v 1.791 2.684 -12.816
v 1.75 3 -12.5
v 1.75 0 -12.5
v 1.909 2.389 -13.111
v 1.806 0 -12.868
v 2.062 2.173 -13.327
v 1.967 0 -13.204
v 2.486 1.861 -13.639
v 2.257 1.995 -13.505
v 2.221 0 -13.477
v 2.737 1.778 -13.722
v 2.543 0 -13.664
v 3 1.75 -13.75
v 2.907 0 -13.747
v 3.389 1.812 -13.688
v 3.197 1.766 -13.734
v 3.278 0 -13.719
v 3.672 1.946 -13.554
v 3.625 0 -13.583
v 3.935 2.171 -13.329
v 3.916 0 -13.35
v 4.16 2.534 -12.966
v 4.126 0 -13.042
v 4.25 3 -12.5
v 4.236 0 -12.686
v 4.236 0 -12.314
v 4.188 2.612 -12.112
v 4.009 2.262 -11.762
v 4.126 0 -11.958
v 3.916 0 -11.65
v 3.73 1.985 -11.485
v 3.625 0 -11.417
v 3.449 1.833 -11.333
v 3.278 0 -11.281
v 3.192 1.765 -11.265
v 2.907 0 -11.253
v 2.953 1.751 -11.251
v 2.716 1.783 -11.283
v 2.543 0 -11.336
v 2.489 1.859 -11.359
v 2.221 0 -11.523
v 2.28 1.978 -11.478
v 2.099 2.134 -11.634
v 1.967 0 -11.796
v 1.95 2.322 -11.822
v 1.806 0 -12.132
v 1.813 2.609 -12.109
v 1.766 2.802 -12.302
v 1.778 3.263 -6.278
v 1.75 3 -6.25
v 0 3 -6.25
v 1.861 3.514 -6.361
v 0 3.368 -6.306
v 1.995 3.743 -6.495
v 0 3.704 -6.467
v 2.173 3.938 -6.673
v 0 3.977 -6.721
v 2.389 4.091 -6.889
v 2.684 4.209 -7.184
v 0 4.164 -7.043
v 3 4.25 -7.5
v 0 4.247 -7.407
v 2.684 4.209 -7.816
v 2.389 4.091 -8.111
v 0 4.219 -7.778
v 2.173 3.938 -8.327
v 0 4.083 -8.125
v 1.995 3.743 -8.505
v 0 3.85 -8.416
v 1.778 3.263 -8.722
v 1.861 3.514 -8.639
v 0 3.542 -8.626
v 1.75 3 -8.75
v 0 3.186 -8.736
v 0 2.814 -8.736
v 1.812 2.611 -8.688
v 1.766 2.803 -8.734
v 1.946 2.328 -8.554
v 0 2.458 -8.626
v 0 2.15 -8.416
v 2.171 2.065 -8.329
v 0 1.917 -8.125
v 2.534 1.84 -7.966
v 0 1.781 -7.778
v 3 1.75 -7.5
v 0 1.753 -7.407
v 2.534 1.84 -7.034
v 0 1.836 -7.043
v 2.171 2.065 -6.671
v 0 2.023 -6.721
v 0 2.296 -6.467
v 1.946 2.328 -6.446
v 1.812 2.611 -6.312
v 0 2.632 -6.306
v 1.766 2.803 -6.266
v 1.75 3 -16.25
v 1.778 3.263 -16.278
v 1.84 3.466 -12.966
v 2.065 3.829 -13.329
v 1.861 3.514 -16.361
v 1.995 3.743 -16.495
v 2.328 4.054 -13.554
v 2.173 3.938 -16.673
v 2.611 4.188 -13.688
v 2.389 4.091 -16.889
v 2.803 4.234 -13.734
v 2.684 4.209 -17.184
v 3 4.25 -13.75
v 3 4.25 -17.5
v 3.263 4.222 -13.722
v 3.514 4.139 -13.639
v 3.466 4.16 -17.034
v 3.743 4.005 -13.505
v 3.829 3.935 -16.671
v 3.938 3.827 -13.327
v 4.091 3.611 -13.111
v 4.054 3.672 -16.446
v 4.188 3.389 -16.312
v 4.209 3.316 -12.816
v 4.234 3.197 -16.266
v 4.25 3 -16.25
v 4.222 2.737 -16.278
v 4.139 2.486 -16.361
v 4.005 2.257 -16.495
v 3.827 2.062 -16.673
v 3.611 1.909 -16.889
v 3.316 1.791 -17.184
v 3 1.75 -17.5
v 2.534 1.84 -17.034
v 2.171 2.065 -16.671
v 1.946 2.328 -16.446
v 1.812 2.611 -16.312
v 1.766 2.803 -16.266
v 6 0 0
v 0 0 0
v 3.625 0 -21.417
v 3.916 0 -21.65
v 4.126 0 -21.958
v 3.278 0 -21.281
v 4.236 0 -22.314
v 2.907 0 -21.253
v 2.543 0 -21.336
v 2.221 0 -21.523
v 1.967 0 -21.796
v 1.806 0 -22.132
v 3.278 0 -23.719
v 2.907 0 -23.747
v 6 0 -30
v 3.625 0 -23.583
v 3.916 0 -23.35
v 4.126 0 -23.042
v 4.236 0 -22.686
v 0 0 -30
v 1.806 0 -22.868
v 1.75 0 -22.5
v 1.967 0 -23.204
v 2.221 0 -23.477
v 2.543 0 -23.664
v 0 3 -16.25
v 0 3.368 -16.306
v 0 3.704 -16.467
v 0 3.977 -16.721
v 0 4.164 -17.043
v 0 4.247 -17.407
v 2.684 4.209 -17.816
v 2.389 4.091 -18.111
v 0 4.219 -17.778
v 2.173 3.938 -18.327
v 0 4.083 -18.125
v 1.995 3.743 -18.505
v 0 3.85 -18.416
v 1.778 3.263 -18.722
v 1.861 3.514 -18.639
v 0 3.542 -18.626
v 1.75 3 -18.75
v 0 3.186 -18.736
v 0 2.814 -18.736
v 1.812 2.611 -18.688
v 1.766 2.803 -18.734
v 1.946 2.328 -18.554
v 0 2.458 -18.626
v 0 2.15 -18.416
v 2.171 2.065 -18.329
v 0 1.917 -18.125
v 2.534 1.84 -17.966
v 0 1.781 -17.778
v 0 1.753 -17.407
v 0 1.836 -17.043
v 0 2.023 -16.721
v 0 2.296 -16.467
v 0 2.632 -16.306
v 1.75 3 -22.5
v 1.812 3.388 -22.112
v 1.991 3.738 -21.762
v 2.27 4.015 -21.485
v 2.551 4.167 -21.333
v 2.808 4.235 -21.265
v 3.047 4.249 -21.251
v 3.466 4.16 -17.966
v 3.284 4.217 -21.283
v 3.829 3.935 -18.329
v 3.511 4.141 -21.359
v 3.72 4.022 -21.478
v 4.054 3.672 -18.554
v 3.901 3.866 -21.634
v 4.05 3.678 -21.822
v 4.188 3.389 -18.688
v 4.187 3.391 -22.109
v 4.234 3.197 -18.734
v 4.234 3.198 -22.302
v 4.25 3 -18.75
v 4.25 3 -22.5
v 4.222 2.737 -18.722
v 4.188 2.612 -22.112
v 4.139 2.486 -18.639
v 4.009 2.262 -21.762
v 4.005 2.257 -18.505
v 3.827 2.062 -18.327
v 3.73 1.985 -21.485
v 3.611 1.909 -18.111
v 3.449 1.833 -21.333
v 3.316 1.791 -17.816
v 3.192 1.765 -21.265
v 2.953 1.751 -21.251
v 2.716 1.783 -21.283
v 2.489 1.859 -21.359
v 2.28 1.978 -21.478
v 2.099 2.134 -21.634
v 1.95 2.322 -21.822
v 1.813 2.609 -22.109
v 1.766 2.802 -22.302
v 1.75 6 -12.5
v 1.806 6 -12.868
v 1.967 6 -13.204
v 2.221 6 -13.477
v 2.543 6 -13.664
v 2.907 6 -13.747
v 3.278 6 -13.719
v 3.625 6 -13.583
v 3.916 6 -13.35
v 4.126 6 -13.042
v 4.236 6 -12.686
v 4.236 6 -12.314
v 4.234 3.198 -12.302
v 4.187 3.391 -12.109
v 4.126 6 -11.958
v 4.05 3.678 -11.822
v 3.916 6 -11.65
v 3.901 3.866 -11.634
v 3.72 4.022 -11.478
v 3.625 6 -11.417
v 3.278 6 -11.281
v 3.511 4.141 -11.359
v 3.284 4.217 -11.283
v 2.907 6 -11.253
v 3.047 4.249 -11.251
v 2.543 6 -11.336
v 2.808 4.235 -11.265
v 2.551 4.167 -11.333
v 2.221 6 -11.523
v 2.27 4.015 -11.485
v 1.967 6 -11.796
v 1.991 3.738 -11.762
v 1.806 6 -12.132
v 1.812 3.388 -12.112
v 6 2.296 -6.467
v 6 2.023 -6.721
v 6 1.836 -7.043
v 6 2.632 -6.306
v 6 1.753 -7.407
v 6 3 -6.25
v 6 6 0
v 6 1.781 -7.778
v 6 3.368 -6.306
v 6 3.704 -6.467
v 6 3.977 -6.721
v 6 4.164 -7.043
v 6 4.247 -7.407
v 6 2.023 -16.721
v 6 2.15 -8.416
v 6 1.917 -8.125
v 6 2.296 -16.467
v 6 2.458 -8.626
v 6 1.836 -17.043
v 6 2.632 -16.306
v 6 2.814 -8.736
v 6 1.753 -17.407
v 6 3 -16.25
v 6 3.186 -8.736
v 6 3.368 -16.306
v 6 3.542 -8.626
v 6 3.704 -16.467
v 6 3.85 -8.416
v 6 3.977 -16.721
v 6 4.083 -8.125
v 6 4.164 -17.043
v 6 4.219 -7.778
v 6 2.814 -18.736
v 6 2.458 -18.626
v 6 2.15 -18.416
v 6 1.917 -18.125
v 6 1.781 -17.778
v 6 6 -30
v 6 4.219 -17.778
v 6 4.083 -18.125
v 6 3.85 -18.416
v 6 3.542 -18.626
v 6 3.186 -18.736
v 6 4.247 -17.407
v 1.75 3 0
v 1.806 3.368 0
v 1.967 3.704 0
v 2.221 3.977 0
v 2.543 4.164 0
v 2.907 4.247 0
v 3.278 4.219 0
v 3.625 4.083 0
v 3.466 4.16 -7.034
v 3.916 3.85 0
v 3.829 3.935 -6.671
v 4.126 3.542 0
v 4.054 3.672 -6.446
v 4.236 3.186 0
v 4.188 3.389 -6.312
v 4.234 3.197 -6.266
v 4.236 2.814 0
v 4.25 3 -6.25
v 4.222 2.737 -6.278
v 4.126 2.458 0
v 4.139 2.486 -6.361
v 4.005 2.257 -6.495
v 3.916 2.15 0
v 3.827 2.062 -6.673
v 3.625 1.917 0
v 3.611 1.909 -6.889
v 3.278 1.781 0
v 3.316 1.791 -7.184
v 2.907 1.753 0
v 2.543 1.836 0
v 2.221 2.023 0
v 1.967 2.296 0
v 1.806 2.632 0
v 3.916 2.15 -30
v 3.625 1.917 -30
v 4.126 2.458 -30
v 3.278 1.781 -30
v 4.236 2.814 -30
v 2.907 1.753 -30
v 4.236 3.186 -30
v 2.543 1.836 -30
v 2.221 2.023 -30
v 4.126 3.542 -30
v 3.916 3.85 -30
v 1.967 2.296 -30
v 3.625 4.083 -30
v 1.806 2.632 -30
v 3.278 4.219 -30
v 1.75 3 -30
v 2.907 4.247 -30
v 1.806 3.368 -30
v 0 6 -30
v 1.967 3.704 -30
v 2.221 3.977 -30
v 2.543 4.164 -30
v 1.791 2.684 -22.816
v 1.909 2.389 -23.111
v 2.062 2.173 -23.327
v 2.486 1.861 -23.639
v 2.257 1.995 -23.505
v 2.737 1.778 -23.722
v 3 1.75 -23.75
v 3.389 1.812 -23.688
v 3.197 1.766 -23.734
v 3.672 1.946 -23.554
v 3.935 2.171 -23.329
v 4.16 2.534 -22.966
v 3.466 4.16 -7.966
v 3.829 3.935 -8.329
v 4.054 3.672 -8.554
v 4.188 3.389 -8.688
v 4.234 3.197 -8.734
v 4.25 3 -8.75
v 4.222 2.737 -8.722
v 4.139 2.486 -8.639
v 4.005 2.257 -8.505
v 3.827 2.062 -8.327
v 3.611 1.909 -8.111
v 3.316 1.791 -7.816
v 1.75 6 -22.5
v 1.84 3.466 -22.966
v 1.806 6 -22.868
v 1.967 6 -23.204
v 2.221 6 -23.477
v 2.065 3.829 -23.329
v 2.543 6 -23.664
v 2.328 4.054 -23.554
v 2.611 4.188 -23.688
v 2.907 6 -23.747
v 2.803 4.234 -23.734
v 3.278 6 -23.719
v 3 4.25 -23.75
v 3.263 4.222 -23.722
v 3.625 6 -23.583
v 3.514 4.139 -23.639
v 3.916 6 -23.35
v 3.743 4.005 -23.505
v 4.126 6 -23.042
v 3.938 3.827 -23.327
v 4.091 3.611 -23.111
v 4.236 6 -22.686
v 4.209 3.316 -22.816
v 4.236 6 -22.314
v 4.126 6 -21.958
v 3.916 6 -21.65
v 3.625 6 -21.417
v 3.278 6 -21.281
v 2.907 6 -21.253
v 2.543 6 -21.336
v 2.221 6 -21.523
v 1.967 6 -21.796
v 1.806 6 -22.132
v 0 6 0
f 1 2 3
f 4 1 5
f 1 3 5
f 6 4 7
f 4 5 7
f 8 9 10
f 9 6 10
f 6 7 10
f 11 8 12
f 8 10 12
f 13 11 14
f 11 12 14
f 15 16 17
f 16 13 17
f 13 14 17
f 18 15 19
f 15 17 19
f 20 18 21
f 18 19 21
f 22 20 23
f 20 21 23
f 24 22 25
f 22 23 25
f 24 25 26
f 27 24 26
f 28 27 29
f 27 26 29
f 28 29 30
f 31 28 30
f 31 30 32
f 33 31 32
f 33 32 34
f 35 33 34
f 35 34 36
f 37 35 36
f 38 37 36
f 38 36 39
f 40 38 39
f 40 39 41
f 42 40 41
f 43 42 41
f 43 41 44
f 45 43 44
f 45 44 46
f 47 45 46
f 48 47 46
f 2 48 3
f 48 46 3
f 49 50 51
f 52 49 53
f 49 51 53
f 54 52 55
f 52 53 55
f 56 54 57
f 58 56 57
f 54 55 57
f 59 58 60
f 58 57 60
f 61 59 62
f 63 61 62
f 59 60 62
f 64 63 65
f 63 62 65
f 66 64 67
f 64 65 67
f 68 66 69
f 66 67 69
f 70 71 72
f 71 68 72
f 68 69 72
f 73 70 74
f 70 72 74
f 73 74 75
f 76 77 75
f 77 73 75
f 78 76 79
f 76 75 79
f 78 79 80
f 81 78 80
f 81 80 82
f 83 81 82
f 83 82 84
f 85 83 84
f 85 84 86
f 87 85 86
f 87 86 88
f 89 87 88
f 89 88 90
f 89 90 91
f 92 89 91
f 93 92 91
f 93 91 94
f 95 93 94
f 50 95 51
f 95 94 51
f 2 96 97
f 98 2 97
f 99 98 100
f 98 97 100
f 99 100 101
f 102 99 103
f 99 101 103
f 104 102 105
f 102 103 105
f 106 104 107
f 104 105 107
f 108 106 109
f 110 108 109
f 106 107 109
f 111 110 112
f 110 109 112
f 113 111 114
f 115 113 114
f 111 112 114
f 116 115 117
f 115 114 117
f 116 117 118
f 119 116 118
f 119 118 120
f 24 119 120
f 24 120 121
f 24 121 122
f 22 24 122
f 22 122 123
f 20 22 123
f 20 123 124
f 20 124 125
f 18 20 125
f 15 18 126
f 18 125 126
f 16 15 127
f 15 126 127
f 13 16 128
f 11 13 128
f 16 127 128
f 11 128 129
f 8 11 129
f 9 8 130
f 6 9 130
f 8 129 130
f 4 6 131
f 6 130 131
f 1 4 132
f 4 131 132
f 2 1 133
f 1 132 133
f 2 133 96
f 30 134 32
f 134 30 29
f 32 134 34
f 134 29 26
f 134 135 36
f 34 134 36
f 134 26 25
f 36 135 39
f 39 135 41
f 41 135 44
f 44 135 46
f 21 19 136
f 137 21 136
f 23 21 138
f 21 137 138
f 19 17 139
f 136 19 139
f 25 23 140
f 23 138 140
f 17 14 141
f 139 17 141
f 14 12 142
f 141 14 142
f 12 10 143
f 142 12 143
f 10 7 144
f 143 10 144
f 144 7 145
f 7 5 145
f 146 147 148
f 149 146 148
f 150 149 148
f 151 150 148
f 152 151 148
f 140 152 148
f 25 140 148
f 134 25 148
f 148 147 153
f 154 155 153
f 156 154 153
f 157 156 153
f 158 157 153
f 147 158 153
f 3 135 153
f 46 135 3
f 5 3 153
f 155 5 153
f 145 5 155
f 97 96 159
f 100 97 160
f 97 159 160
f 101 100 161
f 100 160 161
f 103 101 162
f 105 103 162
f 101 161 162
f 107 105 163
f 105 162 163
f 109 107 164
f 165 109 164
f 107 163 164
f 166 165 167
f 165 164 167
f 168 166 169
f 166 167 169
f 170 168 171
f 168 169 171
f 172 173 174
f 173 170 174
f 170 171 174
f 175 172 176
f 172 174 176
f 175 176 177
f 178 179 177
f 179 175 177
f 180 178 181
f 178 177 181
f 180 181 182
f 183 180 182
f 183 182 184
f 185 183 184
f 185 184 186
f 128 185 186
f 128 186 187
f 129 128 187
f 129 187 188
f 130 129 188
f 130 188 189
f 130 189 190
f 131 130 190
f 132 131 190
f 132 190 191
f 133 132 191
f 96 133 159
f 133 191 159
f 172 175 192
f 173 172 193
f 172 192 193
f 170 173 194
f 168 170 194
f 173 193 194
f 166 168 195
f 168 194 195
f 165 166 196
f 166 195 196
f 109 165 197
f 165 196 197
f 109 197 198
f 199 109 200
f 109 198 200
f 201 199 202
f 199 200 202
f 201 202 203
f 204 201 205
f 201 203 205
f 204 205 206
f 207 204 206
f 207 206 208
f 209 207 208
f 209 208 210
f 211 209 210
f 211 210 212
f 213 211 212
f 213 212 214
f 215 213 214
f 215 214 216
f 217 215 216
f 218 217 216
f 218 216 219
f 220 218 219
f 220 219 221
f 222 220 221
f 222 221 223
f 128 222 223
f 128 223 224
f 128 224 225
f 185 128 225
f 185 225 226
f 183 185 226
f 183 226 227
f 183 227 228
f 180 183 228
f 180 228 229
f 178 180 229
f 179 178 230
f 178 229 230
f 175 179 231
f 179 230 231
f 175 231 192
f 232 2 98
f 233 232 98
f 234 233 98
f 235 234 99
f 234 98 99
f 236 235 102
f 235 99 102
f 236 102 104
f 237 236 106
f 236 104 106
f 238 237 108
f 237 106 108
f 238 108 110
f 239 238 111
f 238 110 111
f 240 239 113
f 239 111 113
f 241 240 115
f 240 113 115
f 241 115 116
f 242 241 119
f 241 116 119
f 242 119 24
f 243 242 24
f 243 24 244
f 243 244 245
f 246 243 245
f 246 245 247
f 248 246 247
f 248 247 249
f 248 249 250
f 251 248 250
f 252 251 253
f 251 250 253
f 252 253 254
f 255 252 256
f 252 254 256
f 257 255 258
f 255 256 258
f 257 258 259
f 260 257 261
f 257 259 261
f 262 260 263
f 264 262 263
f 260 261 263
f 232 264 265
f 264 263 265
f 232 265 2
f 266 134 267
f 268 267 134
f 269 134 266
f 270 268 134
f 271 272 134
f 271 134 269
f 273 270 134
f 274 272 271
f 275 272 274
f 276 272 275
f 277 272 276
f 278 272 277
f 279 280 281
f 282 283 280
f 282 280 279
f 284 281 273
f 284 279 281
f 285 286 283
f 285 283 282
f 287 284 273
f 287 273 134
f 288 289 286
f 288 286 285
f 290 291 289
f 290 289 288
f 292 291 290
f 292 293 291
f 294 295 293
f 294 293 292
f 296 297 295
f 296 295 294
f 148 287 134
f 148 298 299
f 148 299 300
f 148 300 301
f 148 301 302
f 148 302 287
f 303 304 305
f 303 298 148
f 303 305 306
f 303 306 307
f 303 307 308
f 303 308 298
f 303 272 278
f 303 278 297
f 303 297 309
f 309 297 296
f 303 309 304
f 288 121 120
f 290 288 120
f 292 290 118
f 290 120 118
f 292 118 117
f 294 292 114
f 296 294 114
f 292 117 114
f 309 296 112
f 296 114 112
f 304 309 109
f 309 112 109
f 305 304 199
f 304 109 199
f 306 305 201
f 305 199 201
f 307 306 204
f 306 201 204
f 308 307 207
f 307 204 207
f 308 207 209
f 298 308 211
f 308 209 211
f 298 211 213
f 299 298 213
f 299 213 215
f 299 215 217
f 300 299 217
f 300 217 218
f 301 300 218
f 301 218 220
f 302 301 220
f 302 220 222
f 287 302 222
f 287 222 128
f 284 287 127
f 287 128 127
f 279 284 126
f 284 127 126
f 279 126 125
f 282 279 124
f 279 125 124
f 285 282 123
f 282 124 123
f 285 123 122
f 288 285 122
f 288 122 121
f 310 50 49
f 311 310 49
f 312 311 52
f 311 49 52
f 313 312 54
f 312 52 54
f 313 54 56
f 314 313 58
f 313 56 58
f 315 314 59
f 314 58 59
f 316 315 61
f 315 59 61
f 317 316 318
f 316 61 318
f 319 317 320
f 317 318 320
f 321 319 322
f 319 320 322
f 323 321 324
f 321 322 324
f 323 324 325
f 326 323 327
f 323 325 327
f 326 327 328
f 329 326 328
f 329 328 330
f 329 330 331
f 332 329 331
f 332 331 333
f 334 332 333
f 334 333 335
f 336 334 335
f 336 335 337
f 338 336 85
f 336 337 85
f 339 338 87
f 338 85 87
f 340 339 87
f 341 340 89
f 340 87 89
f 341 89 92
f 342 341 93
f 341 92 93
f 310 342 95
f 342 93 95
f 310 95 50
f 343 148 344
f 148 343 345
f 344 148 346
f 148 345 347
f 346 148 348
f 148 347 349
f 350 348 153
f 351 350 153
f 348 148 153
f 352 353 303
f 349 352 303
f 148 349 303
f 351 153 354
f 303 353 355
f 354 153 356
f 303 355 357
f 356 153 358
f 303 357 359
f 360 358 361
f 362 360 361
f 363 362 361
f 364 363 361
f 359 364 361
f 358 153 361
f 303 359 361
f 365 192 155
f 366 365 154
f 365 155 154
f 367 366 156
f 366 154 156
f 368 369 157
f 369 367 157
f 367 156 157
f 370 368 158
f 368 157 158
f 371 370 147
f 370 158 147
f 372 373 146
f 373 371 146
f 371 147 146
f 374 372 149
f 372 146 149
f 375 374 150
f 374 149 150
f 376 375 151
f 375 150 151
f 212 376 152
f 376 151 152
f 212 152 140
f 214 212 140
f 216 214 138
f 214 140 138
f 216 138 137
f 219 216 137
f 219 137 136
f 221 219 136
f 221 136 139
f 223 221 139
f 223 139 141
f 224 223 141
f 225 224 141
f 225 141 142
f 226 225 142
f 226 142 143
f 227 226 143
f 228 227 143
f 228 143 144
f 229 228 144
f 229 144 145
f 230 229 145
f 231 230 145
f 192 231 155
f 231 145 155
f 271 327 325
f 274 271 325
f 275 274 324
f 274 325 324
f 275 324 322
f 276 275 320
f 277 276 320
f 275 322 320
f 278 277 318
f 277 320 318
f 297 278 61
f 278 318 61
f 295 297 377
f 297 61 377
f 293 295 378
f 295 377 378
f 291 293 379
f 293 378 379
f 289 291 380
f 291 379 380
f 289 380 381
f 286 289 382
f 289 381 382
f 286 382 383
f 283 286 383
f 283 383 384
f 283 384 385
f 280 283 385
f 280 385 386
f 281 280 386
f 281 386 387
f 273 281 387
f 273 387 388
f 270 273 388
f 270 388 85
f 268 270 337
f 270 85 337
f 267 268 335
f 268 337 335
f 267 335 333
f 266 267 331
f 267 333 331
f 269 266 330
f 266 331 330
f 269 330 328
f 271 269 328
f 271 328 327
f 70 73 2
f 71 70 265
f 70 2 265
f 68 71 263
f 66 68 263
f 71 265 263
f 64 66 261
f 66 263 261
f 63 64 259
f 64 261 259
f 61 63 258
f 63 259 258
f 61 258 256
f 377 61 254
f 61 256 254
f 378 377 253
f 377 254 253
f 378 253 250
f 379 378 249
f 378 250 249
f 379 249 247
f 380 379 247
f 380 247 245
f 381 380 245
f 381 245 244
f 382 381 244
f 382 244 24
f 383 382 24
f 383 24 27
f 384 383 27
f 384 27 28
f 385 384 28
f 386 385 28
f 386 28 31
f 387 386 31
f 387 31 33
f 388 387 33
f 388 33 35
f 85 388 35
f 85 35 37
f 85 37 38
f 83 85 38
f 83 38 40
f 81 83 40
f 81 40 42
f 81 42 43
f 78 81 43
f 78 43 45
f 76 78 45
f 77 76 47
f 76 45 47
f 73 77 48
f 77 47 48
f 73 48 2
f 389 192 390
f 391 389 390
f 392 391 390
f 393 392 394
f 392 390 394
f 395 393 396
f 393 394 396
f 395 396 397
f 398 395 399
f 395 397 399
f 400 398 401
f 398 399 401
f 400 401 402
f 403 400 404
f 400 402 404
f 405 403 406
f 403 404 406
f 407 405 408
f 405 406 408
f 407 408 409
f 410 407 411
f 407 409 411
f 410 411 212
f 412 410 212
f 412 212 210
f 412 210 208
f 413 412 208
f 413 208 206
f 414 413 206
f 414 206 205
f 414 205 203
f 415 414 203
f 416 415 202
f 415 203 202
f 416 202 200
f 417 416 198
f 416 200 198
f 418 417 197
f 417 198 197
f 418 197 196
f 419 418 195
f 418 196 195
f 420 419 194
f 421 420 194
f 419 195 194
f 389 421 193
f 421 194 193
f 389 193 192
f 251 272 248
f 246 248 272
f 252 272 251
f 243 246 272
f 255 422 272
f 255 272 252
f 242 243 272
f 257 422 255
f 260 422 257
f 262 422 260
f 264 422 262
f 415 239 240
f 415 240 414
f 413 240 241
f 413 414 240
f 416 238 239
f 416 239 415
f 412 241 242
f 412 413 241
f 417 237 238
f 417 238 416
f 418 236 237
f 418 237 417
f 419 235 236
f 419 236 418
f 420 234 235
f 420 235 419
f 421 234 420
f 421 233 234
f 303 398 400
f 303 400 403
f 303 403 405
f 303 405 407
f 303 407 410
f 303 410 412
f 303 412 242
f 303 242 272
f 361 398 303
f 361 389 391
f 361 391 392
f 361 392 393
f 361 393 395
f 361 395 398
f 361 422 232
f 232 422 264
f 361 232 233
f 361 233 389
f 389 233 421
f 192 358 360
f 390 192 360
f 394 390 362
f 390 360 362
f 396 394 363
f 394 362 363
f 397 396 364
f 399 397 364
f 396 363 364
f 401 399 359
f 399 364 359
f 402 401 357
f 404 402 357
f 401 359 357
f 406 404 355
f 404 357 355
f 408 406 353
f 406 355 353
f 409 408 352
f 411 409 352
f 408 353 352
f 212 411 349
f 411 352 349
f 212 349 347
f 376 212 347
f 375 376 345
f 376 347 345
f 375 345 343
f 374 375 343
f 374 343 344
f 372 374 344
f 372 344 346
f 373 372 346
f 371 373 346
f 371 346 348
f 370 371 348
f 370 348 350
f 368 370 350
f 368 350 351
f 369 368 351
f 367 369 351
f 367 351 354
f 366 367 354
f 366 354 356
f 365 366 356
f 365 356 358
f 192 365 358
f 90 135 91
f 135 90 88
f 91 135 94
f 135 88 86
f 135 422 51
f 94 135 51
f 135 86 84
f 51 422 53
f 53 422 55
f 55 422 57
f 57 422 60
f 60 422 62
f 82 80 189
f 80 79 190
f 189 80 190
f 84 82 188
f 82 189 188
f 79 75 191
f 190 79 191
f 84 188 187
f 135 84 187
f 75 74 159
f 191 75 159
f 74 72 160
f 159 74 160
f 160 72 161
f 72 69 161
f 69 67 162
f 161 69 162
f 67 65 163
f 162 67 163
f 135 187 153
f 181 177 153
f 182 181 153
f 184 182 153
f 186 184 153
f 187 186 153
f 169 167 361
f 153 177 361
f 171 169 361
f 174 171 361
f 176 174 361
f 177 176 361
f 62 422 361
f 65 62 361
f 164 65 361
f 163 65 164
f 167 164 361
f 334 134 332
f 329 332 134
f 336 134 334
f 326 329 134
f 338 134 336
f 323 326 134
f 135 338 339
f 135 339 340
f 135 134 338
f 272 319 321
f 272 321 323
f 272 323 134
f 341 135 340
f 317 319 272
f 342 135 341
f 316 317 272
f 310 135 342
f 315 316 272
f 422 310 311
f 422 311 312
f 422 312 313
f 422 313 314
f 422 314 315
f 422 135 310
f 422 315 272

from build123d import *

# Parameters (mm, degrees)
SKETCH_1_W         = 30
SKETCH_1_H         = 6
EXTRUDE_1_DEPTH    = 6
HOLE_WIZARD_M3_1_D = 2.5
HOLE_WIZARD_M3_2_D = 2.5
HOLE_WIZARD_M3_3_D = 2.5


with BuildPart() as part:
    # 草图1 → 凸台-拉伸1 (new body)
    with BuildSketch(Plane(origin=(0, 0, 0), x_dir=(0, 0, -1), z_dir=(1, 0, 0))):
        with Locations((15, 3)):
            Rectangle(SKETCH_1_W, SKETCH_1_H)
    extrude(amount=EXTRUDE_1_DEPTH)

    # M3 螺纹孔1 (through all)
    with Locations(Plane.XY):
        with Locations((3, 3)):
            Hole(HOLE_WIZARD_M3_1_D / 2)

    # M3 螺纹孔2 (through all)
    with Locations(Plane(origin=(0, 6, 0), x_dir=(1, 0, 0), z_dir=(0, 1, 0))):
        with Locations((3, 12.5), (3, 22.5)):
            Hole(HOLE_WIZARD_M3_2_D / 2)

    # M3 螺纹孔3 (through all)
    with Locations(Plane(origin=(6, 0, 0), x_dir=(0, 0, -1), z_dir=(1, 0, 0))):
        with Locations((17.5, 3), (7.5, 3)):
            Hole(HOLE_WIZARD_M3_3_D / 2)


solid = part.part
